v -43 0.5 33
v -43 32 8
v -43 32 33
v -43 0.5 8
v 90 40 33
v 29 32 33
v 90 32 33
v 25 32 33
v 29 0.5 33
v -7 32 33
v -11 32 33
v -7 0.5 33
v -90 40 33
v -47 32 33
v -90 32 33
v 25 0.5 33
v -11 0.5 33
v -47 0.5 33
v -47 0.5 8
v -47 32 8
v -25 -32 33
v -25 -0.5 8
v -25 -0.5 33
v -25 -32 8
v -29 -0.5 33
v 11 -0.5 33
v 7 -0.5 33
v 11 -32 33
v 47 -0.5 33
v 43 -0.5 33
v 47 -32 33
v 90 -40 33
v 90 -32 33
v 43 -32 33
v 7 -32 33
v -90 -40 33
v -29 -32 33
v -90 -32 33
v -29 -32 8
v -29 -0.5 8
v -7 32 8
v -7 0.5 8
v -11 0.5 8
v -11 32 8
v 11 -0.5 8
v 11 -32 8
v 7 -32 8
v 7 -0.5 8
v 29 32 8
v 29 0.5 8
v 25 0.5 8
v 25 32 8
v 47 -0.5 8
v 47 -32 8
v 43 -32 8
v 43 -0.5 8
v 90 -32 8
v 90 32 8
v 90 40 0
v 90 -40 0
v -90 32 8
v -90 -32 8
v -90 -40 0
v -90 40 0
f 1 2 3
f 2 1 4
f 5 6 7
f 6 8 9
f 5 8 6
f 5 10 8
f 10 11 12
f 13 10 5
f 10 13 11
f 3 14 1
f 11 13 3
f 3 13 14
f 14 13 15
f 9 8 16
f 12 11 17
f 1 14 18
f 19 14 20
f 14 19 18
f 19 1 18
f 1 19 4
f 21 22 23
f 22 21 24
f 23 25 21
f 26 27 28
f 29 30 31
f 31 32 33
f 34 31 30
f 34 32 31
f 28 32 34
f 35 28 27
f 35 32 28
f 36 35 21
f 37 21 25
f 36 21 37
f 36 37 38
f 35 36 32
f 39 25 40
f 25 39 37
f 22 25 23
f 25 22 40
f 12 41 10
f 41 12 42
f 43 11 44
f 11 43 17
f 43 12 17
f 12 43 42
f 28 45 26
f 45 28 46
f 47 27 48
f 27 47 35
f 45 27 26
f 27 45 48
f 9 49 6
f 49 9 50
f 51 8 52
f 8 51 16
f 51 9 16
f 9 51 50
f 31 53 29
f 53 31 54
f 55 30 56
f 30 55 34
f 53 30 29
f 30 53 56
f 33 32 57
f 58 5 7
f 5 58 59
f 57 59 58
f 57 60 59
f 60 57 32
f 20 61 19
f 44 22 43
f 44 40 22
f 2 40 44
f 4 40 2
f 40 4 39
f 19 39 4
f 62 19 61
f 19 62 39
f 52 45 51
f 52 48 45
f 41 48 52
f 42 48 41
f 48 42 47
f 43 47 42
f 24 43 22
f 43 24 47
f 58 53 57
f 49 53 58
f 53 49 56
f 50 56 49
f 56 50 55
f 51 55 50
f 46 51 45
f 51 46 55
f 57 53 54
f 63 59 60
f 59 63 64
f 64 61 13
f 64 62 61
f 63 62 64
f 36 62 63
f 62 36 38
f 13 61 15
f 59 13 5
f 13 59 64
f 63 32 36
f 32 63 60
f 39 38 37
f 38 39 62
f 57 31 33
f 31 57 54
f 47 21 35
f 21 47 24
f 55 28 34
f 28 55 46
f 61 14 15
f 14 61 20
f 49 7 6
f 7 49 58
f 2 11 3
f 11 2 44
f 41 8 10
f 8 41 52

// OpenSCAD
$fn = 32;

// ----------------------------------------------------------------------
// Rib frame 180 x 80 x 33
// 6 ribs at 18 mm pitch, staggered
// ----------------------------------------------------------------------

// --- parameters (mm) ---
frame = [180, 80, 8];  // base plate size (x, y, z)
rail_w = 8;            // side rail width
ribs = 6;              // number of ribs
rib_t = 4;             // rib thickness
rib_h = 25;            // rib height above the base plate
pitch = 18;            // pitch between rib centres

// --- derived feature positions (mm) ---
span = (ribs - 1) * pitch;          // = 90   distance between the outer ribs
origin_x = -span / 2;               // = -45   X of the first rib
rib_len = frame[1] / 2 - rail_w + 0.5;  // = 32.5   length of a staggered rib
rib_y = 0.5 + rib_len / 2;          // = 16.75   Y of a staggered rib centre
row_offset = 2 * rib_y;             // = 33.5   distance between the two rows
feature_centers = [
  [origin_x + 0 * pitch, rib_y],
  [origin_x + 1 * pitch, -rib_y],
  [origin_x + 2 * pitch, rib_y],
  [origin_x + 3 * pitch, -rib_y],
  [origin_x + 4 * pitch, rib_y],
  [origin_x + 5 * pitch, -rib_y]
];   // rib centre line, drives the rib loop

// base plate, two side rails, then the ribs read straight off feature_centers
union() {
  translate([-frame[0] / 2, -frame[1] / 2, 0]) cube(frame);
  translate([-frame[0] / 2, -frame[1] / 2, 0]) cube([frame[0], rail_w, frame[2] + rib_h]);
  translate([-frame[0] / 2, frame[1] / 2 - rail_w, 0]) cube([frame[0], rail_w, frame[2] + rib_h]);
  for (centre = feature_centers)
    translate([centre[0] - rib_t / 2, centre[1] - rib_len / 2, frame[2] - 1])
      cube([rib_t, rib_len, rib_h + 1]);
}
